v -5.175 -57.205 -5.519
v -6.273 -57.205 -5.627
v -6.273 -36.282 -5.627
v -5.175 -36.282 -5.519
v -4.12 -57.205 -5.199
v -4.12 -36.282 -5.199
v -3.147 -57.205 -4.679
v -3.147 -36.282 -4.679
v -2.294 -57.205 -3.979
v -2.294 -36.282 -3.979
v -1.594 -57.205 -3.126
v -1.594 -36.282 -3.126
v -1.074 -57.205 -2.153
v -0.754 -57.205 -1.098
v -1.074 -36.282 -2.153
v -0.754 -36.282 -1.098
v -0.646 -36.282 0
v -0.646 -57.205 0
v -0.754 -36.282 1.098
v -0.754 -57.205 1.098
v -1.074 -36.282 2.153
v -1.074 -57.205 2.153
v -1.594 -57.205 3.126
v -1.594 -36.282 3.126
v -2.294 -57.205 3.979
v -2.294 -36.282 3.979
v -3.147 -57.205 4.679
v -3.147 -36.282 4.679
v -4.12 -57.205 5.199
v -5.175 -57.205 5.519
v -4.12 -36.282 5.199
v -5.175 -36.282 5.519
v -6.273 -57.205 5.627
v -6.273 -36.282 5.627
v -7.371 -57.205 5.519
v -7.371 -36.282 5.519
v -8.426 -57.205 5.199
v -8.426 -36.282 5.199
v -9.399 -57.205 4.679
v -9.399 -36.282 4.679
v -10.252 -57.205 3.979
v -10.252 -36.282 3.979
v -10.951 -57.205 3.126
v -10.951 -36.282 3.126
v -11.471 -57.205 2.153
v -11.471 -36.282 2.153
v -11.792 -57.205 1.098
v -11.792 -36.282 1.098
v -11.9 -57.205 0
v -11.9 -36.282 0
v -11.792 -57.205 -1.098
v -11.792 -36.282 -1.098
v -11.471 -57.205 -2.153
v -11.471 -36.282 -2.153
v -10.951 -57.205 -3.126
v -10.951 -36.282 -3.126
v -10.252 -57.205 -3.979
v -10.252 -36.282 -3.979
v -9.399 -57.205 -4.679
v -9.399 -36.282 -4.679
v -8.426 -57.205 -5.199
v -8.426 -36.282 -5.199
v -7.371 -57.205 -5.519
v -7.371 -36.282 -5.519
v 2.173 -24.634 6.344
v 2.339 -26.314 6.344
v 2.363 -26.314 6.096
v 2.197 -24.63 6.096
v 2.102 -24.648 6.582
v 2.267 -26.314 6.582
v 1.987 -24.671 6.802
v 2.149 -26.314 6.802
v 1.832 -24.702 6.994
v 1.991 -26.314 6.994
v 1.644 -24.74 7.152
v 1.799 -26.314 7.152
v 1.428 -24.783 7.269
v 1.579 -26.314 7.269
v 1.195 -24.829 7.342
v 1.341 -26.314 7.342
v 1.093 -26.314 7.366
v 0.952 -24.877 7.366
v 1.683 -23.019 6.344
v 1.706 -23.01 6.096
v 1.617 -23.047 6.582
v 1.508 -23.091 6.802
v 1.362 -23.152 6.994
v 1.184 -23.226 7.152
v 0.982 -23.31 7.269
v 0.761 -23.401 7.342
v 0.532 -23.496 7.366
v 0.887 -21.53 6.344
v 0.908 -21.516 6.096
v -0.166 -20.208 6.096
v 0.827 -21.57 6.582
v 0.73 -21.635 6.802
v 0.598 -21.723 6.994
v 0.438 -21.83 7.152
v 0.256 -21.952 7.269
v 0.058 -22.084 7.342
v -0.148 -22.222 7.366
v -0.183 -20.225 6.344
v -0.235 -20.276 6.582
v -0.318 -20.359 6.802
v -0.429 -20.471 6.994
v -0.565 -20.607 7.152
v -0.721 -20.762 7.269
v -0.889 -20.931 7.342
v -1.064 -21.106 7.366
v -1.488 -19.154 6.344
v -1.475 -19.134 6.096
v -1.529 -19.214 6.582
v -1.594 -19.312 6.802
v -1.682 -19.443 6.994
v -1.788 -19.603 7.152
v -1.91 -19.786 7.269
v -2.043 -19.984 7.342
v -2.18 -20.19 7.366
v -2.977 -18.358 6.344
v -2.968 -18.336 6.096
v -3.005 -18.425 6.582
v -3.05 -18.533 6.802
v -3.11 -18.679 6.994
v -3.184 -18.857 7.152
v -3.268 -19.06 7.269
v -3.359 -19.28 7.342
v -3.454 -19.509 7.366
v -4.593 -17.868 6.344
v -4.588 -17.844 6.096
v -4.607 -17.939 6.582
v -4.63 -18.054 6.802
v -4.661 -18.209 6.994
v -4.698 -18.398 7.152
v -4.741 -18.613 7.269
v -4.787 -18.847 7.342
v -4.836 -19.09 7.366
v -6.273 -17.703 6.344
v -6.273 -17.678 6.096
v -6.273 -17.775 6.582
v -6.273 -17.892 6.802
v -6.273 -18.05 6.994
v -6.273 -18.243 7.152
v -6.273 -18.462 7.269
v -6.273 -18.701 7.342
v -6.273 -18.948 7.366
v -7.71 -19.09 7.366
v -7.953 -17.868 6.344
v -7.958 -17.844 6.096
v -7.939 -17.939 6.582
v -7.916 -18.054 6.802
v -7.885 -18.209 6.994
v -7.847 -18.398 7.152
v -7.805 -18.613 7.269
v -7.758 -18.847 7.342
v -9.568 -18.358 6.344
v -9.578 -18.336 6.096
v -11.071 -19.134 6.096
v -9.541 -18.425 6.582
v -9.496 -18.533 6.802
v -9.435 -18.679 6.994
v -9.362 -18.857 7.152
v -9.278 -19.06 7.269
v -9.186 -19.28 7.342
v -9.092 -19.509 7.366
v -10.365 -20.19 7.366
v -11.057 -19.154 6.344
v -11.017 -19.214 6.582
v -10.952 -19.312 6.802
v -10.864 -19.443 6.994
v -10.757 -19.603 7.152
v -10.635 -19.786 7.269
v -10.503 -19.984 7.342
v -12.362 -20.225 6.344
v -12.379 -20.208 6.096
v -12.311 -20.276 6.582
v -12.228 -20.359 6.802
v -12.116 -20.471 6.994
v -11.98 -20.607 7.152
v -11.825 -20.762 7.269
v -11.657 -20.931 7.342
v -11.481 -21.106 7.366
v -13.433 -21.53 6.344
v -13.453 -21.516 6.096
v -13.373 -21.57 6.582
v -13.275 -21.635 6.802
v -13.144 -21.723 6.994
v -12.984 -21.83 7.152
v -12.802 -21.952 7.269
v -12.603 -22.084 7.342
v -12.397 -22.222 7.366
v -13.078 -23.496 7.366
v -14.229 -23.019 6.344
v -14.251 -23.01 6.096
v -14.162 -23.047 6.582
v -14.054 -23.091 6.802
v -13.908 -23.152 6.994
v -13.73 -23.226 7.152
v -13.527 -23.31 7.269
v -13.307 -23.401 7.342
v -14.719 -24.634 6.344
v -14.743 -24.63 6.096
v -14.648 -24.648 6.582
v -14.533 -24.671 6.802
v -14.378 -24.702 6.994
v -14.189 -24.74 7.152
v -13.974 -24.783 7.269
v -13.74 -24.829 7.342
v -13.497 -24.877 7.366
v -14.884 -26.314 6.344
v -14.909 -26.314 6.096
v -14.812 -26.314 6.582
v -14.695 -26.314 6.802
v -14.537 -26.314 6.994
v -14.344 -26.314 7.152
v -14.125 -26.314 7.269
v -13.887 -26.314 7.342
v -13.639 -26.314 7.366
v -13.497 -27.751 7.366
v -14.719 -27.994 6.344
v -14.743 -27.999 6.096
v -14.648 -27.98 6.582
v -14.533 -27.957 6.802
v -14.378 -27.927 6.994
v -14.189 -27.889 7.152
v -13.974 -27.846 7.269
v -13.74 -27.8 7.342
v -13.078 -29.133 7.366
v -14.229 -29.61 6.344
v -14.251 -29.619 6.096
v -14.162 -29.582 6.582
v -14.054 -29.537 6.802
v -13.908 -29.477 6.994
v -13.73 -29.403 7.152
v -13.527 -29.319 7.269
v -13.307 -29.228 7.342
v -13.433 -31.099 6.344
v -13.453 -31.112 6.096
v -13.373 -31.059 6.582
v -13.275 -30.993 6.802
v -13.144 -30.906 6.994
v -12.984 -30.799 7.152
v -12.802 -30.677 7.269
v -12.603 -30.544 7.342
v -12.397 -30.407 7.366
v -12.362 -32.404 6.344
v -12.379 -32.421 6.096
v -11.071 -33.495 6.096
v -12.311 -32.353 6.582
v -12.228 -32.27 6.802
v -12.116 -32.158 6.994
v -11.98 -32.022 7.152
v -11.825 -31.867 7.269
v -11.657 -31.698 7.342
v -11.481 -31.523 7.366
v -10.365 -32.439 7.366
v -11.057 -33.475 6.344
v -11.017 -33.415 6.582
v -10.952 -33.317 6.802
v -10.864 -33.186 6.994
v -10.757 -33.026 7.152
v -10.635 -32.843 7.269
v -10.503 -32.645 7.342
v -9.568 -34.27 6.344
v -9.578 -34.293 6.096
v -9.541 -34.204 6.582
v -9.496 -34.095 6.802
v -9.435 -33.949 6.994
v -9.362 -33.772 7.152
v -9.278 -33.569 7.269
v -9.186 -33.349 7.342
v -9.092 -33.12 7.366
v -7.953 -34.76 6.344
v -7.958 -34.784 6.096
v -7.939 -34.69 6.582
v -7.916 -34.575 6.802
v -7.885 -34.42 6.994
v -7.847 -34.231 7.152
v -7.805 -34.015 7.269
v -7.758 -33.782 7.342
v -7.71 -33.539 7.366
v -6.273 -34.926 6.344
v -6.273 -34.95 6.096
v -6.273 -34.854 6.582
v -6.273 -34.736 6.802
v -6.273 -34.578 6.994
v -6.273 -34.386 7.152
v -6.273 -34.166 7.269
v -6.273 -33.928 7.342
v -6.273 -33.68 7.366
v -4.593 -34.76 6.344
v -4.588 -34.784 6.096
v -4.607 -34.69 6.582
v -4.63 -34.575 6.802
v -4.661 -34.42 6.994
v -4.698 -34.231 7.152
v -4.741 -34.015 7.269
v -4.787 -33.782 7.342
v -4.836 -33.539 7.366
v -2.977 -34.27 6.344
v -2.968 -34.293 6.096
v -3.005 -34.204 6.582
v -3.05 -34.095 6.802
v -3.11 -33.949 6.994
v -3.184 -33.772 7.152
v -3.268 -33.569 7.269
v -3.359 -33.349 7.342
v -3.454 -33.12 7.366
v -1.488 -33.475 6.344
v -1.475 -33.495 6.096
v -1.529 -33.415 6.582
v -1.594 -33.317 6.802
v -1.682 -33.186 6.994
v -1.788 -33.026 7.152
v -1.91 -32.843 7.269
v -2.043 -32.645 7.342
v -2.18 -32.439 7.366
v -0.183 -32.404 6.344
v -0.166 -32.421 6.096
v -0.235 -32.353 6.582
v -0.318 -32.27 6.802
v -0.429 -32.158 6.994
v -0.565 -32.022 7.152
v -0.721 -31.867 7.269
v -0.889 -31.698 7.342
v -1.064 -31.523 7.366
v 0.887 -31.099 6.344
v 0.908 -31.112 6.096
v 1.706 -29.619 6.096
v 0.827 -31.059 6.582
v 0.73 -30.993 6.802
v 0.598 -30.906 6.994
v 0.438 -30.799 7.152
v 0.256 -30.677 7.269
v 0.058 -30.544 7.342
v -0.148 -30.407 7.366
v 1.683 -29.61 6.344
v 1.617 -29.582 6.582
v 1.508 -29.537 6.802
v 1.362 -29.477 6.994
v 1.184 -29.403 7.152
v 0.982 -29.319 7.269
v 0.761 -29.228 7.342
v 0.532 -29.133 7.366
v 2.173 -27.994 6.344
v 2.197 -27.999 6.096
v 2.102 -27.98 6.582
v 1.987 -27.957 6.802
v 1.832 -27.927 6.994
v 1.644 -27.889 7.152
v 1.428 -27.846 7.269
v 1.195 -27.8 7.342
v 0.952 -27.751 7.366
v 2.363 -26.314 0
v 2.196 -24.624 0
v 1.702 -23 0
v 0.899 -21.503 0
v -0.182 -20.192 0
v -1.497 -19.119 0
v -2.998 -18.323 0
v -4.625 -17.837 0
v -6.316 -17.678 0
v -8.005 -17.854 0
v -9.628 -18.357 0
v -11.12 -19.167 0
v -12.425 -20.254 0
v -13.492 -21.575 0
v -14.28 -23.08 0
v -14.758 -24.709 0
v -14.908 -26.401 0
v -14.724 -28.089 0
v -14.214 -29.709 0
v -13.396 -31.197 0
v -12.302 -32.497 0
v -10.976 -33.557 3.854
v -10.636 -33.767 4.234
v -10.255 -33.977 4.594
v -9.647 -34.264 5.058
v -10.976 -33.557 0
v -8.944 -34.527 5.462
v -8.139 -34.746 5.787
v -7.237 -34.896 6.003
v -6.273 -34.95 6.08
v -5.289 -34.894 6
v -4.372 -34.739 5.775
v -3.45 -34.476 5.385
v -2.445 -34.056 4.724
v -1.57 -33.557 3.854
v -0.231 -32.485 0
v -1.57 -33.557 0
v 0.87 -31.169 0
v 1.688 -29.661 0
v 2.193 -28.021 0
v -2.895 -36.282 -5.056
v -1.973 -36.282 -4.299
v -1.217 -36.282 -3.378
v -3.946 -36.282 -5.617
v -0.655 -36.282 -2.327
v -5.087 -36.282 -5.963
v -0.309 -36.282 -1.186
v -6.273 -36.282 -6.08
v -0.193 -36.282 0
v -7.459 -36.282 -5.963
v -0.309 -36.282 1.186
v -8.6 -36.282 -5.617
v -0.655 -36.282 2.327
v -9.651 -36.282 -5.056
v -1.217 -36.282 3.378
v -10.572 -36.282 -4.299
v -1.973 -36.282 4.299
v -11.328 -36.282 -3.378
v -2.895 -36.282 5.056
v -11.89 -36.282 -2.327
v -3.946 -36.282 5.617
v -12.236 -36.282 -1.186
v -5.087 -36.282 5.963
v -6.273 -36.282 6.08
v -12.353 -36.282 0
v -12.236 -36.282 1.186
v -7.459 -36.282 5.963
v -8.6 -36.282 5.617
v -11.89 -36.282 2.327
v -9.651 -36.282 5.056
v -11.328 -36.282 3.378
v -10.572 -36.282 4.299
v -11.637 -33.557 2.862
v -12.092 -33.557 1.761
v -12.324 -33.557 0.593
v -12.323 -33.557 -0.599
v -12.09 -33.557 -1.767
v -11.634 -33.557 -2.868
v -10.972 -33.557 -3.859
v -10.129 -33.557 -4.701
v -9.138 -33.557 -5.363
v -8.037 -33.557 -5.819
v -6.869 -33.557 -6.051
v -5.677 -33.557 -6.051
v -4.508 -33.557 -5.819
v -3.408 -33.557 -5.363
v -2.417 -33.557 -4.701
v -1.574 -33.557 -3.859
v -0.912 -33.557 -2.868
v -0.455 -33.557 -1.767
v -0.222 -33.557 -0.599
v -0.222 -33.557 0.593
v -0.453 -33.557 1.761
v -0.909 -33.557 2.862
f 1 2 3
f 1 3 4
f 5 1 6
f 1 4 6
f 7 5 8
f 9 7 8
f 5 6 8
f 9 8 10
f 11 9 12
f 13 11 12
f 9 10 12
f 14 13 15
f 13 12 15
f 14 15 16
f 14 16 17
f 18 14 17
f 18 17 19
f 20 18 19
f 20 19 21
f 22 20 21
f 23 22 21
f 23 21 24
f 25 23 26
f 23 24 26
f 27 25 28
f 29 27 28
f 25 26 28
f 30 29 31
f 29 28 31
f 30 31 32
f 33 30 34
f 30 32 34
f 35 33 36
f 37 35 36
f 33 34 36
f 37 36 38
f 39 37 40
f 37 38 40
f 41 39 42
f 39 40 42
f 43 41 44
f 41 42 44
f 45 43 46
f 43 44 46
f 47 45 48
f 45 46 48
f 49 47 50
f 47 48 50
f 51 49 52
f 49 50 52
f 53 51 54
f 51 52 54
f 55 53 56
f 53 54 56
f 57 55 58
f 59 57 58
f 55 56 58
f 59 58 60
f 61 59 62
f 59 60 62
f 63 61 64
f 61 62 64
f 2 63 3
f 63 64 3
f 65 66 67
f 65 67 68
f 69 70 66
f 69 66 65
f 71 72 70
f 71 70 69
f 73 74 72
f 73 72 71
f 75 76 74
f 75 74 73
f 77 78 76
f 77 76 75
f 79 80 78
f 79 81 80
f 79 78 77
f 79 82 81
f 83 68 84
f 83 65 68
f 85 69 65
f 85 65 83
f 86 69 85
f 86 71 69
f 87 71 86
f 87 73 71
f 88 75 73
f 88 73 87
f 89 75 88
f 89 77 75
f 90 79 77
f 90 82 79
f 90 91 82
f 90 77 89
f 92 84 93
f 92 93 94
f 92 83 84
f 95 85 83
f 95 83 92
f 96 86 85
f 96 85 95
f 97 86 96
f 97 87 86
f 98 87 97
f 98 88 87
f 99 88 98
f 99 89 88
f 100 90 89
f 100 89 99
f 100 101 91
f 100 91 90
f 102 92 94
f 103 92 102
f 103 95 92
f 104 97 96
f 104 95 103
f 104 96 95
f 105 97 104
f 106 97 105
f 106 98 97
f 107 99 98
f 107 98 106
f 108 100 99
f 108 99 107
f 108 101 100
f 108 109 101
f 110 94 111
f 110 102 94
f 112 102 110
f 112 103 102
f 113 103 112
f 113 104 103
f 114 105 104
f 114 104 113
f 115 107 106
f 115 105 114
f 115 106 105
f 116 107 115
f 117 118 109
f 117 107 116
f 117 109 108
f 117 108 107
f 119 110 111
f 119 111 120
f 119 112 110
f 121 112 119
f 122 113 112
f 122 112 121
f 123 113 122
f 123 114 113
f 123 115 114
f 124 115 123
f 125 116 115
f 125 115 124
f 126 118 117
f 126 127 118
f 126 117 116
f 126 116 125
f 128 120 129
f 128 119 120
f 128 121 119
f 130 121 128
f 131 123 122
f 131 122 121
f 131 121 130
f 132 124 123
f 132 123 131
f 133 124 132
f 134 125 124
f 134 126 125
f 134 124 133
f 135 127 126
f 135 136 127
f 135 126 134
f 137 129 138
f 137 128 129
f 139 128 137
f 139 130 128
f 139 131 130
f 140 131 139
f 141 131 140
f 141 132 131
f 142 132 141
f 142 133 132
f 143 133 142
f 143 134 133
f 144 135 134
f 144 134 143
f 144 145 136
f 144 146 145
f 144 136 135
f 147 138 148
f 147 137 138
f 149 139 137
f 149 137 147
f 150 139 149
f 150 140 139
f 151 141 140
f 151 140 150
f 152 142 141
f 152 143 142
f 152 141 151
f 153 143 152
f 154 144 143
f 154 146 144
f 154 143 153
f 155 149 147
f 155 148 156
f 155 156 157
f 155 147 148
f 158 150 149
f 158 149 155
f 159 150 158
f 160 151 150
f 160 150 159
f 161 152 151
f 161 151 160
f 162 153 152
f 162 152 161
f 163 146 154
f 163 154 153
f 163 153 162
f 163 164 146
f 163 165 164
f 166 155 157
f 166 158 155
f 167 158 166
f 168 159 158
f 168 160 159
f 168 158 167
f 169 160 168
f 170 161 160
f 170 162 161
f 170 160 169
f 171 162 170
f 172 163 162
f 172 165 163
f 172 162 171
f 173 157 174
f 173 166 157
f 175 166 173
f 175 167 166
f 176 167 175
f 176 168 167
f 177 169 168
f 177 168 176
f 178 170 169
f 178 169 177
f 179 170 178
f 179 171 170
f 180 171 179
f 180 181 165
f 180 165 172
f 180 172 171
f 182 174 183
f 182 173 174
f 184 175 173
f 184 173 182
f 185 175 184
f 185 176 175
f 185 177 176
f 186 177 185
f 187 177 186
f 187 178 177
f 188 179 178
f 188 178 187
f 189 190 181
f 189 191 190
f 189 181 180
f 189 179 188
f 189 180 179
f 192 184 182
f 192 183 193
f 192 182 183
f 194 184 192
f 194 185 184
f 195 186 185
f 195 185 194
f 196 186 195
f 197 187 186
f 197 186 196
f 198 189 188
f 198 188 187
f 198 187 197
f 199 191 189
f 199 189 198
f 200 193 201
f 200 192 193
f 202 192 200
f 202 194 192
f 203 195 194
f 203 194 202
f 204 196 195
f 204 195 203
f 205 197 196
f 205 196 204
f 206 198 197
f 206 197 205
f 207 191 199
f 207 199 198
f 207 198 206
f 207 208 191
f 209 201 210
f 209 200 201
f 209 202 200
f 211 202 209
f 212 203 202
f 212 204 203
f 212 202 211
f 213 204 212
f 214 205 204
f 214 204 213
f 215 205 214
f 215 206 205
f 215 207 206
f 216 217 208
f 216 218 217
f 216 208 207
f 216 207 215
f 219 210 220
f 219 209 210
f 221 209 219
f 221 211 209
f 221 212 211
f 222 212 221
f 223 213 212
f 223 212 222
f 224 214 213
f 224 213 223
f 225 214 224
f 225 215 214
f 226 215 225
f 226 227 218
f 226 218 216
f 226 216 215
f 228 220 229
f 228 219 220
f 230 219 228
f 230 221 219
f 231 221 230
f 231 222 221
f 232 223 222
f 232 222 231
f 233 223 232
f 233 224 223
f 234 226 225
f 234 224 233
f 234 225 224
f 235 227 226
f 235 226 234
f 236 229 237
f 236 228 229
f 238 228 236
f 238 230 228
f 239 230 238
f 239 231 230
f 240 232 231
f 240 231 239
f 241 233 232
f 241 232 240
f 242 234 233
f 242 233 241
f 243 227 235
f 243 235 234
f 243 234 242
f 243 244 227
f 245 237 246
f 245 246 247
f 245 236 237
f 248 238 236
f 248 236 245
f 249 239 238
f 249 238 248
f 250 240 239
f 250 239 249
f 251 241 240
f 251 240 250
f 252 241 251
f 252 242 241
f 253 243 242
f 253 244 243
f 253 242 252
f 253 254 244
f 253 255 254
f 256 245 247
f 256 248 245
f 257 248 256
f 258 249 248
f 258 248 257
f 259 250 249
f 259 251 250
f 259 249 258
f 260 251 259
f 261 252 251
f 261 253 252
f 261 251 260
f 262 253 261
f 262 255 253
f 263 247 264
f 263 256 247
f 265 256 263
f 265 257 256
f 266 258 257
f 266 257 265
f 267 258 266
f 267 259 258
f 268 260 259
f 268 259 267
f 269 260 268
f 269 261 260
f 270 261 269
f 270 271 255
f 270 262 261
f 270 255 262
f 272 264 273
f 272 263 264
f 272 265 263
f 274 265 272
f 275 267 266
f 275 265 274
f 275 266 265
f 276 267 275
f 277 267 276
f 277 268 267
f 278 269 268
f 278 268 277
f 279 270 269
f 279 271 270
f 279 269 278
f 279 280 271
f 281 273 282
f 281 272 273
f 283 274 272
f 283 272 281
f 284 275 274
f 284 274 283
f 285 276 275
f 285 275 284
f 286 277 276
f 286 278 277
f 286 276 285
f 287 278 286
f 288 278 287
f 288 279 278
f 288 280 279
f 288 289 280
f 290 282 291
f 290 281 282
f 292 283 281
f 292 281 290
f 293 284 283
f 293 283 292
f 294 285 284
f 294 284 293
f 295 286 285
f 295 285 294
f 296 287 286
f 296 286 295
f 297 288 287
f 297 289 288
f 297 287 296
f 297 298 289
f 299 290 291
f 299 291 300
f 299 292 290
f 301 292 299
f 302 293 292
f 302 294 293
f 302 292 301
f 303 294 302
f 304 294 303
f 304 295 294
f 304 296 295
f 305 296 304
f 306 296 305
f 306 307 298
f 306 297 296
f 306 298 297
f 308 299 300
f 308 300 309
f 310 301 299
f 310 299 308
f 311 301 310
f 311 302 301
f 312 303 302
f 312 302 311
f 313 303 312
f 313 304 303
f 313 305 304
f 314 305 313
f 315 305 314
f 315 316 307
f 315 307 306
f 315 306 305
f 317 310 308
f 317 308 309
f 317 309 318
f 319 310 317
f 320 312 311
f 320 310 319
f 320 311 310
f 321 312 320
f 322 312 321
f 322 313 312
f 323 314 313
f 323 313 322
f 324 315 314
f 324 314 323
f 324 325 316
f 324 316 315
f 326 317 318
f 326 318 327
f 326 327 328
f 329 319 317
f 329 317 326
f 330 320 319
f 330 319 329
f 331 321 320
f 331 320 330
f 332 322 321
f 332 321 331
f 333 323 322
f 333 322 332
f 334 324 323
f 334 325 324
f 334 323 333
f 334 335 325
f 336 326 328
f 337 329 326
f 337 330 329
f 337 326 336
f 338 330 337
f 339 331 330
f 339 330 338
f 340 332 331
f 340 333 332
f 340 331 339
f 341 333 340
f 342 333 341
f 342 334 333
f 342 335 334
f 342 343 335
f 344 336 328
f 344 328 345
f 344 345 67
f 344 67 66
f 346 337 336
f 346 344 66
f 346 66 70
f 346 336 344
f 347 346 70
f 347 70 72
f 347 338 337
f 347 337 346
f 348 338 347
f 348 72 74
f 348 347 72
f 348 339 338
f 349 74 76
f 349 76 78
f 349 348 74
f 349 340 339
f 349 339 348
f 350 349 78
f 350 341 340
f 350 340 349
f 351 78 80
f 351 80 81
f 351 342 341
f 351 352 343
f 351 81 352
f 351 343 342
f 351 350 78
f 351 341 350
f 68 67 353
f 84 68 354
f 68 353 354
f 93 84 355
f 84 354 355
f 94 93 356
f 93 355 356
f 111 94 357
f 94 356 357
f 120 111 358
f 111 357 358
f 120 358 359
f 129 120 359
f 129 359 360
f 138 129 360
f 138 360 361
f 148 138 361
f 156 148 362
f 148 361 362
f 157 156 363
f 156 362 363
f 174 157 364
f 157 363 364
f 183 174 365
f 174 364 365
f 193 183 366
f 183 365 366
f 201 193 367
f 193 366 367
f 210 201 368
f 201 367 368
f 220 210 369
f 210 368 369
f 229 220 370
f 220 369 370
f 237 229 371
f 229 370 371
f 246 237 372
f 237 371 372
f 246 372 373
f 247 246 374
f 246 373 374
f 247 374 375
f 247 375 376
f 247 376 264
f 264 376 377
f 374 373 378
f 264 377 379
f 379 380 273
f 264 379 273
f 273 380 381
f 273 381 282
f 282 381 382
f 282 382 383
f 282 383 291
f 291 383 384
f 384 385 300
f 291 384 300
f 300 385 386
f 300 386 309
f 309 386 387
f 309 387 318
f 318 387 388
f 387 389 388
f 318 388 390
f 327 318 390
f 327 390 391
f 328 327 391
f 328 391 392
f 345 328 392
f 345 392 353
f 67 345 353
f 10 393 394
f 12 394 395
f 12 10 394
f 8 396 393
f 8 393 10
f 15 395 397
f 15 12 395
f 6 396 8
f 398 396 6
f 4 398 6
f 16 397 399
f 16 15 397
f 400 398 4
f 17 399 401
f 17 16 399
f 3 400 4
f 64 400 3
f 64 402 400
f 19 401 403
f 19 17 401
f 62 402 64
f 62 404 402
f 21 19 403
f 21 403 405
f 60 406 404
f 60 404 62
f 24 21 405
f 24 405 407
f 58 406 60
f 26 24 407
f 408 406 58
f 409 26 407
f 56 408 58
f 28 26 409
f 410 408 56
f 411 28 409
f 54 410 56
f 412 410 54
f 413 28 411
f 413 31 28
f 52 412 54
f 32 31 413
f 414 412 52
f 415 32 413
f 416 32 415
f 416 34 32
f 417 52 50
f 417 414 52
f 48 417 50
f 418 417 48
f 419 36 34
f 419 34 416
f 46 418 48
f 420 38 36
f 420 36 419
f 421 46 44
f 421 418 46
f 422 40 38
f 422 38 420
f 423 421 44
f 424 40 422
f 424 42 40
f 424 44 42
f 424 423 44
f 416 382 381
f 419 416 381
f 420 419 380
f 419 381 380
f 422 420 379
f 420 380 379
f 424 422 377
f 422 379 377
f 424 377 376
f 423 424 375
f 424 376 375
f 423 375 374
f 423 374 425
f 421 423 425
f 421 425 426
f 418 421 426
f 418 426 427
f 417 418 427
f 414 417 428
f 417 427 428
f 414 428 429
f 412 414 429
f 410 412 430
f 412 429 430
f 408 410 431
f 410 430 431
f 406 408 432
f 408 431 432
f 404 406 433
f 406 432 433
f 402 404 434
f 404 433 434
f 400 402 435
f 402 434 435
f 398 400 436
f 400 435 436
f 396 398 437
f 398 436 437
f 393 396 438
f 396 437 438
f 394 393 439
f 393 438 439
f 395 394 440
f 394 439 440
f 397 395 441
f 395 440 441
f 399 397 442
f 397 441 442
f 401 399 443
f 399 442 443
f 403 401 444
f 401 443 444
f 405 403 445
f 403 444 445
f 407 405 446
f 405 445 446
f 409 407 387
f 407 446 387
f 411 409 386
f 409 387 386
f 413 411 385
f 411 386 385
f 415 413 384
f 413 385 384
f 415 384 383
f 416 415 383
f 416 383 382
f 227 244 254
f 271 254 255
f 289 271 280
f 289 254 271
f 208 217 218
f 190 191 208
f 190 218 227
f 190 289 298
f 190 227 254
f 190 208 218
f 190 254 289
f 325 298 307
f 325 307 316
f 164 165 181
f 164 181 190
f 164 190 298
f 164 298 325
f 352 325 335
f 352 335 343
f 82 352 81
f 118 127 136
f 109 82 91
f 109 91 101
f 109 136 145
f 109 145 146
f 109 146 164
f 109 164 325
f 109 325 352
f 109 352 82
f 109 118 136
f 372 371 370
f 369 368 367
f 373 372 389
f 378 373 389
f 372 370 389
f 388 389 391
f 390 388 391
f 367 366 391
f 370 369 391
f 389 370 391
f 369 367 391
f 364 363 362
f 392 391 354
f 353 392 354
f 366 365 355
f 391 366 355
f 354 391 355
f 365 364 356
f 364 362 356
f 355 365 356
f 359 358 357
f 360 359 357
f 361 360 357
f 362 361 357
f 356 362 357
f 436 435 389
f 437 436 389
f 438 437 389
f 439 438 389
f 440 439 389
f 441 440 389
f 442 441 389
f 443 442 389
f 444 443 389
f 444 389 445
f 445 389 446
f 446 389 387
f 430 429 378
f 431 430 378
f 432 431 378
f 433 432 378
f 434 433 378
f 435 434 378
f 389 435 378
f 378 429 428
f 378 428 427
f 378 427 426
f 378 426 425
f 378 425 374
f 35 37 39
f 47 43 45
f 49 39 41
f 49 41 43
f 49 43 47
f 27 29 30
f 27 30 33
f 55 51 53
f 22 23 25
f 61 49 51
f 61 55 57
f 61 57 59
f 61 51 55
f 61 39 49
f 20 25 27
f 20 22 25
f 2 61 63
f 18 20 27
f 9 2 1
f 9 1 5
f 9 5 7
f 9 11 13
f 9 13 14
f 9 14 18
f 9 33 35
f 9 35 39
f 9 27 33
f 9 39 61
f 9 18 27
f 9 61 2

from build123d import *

# Parameters (mm, degrees)
SKETCH1_R      = 8.636
EXTRUDE1_DEPTH = 7.366
FILLET1_R      = 1.27
SKETCH2_W      = 6.080205461
SKETCH2_H      = 2.724463649
SKETCH3_R      = 5.626834032
EXTRUDE2_DEPTH = 20.922880412


with BuildPart() as part:
    # Sketch1 → Extrude1 (new body)
    with BuildSketch(Plane.XY):
        with Locations((-6.272807724, -26.314359982)):
            Circle(SKETCH1_R)
    extrude(amount=EXTRUDE1_DEPTH)

    # Fillet1
    fillet1_edges = [part.edges().sort_by_distance(p)[0] for p in [
        (-14.908807724, -26.314359982, 7.366),
    ]]
    fillet(fillet1_edges, radius=FILLET1_R)

    # Sketch2 → Revolve1 (revolve)
    with BuildSketch(Plane.XY, mode=Mode.PRIVATE) as revolve1_sk:
        with Locations((-9.312910455, -34.919678092)):
            Rectangle(SKETCH2_W, SKETCH2_H)
    revolve(revolve1_sk.sketch.rotate(Axis((-6.272807724, -33.557446268, 0), (0, -1, 0)), 270), axis=Axis((-6.272807724, -33.557446268, 0), (0, -1, 0)))

    # Sketch3 → Extrude2 (add)
    with BuildSketch(Plane.XZ.offset(36.281909917)):
        with Locations(Location((-6.272807724, 0, 0), (0, 0, 270))):
            Circle(SKETCH3_R)
    extrude(amount=EXTRUDE2_DEPTH)


solid = part.part
